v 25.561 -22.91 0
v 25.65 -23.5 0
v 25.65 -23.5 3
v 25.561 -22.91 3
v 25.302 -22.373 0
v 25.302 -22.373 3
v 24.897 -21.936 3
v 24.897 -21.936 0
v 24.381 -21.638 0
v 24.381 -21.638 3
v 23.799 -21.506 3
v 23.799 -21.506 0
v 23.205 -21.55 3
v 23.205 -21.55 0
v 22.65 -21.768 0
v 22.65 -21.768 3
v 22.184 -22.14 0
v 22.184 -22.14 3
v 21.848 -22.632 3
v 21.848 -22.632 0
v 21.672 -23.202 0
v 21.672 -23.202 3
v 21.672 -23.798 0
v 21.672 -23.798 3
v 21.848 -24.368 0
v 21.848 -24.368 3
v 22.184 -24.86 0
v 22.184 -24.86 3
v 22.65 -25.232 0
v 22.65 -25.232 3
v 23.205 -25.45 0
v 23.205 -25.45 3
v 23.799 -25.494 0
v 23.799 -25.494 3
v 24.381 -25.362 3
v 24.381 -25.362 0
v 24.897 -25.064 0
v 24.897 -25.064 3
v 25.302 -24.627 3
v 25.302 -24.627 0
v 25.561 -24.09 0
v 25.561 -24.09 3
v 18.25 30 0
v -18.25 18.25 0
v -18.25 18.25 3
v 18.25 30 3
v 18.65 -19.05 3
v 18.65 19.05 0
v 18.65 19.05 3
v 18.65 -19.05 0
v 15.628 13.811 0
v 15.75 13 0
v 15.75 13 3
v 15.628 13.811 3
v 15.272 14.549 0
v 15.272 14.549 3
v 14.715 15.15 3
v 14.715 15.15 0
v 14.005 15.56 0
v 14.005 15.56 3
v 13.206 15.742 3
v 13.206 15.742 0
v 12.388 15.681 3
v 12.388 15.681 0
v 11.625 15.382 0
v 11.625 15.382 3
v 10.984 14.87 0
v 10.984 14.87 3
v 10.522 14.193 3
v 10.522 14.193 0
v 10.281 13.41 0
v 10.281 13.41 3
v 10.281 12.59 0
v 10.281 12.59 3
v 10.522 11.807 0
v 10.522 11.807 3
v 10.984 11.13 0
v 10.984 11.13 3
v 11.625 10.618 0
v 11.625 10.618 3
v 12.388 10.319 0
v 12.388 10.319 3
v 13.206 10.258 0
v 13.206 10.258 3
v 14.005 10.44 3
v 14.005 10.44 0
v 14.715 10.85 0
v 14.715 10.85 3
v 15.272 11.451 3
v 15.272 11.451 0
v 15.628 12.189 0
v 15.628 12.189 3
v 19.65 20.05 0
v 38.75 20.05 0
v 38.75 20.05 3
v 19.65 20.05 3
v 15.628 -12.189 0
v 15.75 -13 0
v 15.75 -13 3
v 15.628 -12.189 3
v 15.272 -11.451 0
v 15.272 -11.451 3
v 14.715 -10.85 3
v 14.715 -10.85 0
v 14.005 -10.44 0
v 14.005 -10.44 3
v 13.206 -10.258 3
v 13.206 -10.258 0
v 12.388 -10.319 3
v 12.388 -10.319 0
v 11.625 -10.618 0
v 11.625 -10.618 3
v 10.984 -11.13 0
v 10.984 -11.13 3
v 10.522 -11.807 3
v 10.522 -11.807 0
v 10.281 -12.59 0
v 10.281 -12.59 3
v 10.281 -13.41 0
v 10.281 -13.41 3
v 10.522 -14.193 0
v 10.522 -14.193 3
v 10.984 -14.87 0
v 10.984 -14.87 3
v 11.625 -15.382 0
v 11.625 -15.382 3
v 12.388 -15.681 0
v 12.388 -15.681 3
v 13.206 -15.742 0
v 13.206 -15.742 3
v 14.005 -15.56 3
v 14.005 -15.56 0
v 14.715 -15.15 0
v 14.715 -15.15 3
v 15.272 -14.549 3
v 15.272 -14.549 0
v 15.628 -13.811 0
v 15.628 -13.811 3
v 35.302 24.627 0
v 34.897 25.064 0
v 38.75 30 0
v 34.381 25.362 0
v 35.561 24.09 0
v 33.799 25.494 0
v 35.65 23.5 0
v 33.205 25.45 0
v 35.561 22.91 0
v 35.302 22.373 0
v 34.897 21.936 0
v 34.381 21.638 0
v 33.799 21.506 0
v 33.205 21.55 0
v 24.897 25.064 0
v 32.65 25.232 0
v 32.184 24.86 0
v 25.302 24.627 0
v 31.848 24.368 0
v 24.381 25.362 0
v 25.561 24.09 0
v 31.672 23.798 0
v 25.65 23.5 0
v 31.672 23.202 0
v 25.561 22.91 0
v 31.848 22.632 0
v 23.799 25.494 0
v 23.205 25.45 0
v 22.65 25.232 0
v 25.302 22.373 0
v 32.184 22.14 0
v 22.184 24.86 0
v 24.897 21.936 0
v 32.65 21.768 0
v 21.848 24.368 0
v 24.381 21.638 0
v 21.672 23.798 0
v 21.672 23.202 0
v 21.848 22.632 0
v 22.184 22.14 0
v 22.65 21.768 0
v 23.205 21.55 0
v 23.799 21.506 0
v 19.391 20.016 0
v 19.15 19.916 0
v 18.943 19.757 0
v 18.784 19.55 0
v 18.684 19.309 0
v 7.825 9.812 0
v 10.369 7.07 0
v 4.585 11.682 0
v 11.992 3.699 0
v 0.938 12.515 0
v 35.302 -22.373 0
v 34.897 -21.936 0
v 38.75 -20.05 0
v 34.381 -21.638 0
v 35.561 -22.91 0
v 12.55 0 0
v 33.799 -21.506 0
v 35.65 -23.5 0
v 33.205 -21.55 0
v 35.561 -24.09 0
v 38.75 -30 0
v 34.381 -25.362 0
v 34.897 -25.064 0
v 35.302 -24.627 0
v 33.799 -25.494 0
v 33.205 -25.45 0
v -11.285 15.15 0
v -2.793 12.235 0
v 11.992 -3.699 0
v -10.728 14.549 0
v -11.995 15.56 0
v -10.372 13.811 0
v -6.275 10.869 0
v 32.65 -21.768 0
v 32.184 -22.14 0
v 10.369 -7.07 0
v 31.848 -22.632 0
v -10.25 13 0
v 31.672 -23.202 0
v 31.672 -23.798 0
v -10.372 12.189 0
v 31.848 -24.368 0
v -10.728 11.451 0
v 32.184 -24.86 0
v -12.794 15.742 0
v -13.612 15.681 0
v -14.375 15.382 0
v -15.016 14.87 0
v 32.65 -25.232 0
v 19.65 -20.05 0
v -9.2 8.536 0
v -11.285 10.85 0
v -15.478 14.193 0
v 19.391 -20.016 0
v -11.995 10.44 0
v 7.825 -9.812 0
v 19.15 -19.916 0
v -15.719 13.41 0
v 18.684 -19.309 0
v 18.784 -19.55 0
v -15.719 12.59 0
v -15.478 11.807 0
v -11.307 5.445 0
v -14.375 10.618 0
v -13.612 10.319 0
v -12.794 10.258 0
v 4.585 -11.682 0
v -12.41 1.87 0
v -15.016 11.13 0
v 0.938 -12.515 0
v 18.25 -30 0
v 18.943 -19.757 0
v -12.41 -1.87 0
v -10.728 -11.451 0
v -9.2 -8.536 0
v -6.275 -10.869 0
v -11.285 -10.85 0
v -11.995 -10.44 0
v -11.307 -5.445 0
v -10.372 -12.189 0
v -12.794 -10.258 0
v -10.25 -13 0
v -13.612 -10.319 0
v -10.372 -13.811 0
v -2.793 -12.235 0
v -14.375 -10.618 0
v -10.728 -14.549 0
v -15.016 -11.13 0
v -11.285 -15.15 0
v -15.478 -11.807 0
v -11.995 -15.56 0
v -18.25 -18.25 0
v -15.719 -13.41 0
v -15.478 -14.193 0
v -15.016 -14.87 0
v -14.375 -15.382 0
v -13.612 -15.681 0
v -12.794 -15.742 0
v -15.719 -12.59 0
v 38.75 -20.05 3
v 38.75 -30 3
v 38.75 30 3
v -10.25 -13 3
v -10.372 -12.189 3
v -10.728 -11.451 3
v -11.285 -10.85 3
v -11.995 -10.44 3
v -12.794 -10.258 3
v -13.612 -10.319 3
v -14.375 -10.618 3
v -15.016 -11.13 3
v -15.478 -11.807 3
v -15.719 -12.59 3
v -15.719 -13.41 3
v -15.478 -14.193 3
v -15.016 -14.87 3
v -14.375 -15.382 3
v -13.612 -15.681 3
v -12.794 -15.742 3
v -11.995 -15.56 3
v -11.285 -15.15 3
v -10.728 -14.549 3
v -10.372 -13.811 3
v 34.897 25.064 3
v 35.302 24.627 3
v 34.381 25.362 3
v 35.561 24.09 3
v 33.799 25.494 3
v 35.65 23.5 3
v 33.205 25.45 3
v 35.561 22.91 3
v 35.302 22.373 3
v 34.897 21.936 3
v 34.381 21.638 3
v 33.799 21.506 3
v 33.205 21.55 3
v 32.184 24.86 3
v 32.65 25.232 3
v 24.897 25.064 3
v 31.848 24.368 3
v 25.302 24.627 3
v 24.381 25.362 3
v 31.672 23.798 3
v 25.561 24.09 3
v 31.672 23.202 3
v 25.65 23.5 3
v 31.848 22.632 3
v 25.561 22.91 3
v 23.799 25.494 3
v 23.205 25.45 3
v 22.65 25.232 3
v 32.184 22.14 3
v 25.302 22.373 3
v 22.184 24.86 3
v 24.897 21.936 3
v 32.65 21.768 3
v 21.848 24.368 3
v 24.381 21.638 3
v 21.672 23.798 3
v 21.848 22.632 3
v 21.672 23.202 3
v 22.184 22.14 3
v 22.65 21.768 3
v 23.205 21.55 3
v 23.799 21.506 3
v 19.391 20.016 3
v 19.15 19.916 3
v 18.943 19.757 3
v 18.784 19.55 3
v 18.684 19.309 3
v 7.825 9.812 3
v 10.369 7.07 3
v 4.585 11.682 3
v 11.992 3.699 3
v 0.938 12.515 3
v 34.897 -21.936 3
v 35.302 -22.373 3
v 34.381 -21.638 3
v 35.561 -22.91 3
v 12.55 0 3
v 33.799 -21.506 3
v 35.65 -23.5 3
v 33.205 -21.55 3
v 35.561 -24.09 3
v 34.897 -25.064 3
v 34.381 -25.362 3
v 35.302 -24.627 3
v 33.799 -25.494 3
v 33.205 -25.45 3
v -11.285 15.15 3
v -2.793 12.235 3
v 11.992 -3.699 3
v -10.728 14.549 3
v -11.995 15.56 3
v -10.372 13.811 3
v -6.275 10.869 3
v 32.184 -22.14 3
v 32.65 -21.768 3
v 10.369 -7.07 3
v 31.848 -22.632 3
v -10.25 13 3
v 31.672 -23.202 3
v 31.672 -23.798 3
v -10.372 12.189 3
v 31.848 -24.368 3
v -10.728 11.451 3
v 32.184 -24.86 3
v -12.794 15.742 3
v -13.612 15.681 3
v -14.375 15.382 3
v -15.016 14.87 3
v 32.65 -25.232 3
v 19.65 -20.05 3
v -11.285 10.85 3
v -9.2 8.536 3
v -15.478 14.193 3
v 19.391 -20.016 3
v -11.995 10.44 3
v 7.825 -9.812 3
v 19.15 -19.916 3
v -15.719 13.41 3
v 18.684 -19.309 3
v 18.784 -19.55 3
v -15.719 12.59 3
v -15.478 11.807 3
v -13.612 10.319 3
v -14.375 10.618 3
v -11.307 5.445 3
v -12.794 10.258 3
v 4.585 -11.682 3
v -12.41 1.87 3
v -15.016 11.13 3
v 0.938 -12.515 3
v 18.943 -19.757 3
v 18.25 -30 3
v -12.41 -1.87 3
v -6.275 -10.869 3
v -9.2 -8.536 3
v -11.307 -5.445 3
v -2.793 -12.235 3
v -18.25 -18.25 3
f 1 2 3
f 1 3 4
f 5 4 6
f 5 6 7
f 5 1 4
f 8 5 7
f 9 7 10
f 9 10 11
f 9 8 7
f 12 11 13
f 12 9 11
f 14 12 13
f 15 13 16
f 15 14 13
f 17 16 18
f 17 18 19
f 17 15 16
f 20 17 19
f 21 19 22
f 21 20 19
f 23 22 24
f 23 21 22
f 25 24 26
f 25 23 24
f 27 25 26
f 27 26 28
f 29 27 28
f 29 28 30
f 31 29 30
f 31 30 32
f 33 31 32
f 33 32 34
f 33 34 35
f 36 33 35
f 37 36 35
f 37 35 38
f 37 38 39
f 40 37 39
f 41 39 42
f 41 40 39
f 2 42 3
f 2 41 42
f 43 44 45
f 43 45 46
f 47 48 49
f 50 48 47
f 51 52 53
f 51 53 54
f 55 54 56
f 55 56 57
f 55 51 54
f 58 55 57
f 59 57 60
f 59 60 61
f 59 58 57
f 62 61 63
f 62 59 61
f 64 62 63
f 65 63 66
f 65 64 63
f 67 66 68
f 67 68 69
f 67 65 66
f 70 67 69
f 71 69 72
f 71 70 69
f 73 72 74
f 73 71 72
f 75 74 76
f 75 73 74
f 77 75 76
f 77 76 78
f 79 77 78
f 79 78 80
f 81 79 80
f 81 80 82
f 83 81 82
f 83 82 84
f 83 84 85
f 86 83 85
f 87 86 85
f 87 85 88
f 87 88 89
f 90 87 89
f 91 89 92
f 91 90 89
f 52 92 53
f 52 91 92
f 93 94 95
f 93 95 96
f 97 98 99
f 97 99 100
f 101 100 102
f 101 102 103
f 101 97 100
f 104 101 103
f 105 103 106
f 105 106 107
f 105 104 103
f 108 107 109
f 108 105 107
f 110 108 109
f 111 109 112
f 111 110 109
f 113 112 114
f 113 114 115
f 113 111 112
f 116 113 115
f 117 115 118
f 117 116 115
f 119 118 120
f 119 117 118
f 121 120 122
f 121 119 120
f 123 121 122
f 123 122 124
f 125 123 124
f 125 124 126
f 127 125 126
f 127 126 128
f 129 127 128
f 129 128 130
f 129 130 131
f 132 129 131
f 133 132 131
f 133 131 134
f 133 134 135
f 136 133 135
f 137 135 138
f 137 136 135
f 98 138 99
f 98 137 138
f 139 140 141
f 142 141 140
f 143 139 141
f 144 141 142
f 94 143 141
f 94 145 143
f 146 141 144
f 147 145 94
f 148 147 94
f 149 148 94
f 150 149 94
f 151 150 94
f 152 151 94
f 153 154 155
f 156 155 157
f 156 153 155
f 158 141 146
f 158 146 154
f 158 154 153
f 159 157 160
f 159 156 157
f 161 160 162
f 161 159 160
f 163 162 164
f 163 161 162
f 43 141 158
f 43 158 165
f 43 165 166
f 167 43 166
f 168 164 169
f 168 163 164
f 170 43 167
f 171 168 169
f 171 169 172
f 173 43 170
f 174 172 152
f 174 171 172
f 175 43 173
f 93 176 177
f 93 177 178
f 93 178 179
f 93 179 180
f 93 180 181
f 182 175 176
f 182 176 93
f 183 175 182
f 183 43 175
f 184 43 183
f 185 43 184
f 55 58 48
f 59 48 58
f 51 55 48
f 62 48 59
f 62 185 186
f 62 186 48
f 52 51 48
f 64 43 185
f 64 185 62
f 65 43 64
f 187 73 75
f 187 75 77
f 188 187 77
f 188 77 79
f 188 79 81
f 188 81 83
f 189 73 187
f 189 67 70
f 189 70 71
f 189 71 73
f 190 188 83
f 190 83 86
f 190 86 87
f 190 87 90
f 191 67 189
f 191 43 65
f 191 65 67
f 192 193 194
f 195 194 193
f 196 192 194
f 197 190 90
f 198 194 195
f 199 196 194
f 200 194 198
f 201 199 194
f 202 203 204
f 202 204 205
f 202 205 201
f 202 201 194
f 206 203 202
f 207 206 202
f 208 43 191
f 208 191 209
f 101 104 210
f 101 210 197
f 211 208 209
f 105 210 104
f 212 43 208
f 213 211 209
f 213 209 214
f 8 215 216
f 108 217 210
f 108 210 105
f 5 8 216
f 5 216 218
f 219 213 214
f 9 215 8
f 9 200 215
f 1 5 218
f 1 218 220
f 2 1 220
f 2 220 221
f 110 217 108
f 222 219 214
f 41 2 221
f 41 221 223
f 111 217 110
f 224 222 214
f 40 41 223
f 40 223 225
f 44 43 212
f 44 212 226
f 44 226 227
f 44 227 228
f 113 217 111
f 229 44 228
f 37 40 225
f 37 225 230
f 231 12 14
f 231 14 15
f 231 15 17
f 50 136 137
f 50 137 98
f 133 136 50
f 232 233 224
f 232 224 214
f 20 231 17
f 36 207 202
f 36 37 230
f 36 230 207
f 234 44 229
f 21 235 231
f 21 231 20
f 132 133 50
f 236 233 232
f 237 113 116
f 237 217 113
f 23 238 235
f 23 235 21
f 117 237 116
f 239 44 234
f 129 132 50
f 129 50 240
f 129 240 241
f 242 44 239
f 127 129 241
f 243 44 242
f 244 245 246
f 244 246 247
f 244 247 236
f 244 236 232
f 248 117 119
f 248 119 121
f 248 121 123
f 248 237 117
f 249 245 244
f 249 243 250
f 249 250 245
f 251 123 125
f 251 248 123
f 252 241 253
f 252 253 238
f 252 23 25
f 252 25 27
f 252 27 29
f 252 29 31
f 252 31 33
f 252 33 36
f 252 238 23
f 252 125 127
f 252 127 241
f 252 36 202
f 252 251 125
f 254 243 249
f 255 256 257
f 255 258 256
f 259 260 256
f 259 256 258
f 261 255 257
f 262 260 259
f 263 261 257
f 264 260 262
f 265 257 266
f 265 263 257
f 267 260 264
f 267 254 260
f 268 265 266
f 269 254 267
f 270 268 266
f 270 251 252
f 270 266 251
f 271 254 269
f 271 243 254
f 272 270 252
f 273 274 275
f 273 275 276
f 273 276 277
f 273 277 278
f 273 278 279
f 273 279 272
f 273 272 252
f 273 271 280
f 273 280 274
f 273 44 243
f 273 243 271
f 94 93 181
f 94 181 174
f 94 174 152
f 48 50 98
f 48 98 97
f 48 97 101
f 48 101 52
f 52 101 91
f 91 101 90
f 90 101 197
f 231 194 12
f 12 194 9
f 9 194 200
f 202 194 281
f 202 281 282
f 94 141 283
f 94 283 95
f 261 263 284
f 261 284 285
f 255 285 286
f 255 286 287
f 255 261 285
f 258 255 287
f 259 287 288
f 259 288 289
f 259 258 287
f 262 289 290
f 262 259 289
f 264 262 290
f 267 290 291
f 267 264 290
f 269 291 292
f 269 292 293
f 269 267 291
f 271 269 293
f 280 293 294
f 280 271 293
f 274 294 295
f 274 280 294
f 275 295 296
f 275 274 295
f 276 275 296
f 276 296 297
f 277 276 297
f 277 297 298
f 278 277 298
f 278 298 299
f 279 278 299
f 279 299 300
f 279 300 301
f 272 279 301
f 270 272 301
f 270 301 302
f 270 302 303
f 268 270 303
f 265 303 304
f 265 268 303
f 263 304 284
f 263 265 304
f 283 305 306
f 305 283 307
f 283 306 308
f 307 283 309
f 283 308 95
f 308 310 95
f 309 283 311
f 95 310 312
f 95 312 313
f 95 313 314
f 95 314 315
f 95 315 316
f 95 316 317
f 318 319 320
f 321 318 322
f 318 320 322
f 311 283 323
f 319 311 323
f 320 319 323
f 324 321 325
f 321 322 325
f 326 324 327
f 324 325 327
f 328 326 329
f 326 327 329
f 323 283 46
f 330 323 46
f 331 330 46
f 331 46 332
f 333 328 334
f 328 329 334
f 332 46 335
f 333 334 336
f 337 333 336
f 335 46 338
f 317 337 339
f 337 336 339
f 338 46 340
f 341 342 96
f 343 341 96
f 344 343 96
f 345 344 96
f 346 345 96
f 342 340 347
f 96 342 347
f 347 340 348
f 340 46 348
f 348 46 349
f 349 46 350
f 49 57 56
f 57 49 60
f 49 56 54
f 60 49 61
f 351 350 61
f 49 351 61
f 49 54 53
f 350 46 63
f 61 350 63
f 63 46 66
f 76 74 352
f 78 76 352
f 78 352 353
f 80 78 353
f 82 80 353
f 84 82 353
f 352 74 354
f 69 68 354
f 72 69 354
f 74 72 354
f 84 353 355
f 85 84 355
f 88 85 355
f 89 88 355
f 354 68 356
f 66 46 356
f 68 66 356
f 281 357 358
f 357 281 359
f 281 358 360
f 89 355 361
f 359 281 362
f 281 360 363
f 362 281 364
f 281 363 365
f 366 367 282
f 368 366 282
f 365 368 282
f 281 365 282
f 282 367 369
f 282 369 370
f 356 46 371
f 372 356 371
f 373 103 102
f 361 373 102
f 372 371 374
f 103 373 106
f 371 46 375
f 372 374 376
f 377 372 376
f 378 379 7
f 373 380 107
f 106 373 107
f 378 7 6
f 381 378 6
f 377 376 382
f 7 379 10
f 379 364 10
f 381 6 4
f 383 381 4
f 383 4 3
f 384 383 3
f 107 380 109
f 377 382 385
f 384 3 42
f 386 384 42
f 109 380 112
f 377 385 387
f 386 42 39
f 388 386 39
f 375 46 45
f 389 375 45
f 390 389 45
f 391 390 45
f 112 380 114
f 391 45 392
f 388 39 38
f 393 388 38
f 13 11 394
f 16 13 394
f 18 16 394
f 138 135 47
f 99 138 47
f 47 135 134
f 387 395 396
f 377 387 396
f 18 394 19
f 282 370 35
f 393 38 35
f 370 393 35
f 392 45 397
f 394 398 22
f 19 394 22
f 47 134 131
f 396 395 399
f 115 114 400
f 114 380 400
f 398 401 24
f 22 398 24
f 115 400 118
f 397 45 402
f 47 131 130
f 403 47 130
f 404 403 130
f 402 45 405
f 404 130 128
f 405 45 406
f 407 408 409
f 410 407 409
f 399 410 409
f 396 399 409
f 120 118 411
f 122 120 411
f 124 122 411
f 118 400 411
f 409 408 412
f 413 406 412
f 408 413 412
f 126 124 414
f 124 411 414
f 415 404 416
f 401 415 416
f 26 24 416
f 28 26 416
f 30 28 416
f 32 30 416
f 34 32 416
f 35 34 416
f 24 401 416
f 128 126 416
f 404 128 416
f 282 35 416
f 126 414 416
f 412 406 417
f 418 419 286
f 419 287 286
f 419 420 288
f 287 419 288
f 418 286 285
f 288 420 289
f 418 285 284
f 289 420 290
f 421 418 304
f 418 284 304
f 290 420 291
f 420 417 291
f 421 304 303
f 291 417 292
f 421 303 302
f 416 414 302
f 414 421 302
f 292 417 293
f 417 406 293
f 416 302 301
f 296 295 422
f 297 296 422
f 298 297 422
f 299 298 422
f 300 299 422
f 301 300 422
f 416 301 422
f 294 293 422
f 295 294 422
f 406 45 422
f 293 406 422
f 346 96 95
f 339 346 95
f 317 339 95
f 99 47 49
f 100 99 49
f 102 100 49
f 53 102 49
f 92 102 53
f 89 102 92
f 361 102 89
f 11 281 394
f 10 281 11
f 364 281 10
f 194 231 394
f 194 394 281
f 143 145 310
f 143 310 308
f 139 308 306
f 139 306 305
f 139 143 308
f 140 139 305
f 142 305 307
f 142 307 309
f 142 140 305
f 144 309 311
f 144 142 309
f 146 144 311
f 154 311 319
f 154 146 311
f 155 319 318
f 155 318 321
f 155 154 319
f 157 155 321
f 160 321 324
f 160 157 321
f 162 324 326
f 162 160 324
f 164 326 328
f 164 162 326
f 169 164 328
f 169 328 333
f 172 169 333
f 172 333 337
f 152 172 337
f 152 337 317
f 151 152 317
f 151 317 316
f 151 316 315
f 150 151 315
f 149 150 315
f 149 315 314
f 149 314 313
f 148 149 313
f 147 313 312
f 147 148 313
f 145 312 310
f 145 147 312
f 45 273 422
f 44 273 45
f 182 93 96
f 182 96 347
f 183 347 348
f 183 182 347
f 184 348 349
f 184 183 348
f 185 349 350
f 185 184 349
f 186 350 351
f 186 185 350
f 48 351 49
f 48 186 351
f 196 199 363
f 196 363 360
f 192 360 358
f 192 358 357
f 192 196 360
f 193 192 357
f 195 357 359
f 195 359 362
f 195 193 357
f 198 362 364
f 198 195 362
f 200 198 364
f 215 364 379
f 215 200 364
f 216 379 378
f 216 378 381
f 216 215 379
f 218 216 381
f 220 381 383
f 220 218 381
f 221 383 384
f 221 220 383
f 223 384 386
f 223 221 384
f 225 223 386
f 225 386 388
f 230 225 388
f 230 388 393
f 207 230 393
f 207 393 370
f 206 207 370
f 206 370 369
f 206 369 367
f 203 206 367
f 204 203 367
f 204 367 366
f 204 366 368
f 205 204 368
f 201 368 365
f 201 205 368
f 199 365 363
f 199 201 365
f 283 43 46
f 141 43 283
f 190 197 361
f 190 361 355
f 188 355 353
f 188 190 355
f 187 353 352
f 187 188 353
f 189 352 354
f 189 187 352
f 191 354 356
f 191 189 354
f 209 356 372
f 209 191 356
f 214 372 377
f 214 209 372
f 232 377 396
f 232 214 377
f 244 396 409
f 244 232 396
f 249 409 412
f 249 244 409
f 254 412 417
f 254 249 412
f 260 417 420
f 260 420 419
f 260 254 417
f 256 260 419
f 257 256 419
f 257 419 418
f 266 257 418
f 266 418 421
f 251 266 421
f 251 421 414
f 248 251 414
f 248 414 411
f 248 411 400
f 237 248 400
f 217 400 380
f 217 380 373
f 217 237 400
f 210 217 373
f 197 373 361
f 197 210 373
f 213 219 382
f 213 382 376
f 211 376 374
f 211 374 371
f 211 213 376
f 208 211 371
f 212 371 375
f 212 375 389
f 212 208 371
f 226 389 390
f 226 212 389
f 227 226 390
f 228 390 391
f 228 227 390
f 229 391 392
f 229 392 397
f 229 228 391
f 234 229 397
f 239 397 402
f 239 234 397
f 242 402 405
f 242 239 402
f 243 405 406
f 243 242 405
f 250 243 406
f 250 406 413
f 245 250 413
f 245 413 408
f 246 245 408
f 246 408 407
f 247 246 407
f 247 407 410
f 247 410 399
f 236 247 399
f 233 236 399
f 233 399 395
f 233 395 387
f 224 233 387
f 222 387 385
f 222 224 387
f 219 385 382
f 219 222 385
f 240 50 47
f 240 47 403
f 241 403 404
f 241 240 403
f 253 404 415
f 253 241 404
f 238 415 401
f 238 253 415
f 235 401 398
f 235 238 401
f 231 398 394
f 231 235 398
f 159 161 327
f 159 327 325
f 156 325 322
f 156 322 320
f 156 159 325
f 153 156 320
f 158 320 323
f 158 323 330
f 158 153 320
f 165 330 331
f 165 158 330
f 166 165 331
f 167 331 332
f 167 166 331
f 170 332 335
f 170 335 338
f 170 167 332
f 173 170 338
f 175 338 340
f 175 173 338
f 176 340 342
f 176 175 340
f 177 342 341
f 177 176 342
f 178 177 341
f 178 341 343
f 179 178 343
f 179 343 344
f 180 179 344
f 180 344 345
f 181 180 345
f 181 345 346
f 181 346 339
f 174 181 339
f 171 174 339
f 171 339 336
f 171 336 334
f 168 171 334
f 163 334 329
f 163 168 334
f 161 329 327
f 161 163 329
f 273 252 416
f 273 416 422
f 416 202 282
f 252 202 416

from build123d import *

# Parameters (mm, degrees)
SKETCH1_R           = 2.75
SKETCH1_R_2         = 12.55
SKETCH1_R_3         = 2
BOSS_EXTRUDE1_DEPTH = 3


with BuildPart() as part:
    # Sketch1 → Boss-Extrude1 (new body)
    with BuildSketch(Plane(origin=(0, 0, 0), x_dir=(0, 1, 0), z_dir=(0, 0, 1))):
        with BuildLine():
            Line((-18.25, 18.25), (18.25, 18.25))
            Line((18.25, 18.25), (30, -18.25))
            Line((30, -18.25), (30, -38.75))
            Line((30, -38.75), (20.05, -38.75))
            Line((20.05, -38.75), (20.05, -19.65))
            ThreePointArc((20.05, -19.65), (19.757106781, -18.942893219), (19.05, -18.65))
            Line((19.05, -18.65), (-19.05, -18.65))
            ThreePointArc((-19.05, -18.65), (-19.757106781, -18.942893219), (-20.05, -19.65))
            Line((-20.05, -19.65), (-20.05, -38.75))
            Line((-20.05, -38.75), (-30, -38.75))
            Line((-30, -38.75), (-30, -18.25))
            Line((-30, -18.25), (-18.25, 18.25))
        make_face()
        with Locations(Location((-13, 13, 0), (0, 0, 270))):
            Circle(SKETCH1_R, mode=Mode.SUBTRACT)
        with Locations(Location((0, 0, 0), (0, 0, 270))):
            Circle(SKETCH1_R_2, mode=Mode.SUBTRACT)
        with Locations(Location((13, 13, 0), (0, 0, 270))):
            Circle(SKETCH1_R, mode=Mode.SUBTRACT)
        with Locations(Location((13, -13, 0), (0, 0, 270))):
            Circle(SKETCH1_R, mode=Mode.SUBTRACT)
        with Locations(Location((-13, -13, 0), (0, 0, 270))):
            Circle(SKETCH1_R, mode=Mode.SUBTRACT)
        with Locations(Location((-23.5, -23.65, 0), (0, 0, 270))):
            Circle(SKETCH1_R_3, mode=Mode.SUBTRACT)
        with Locations(Location((23.5, -23.65, 0), (0, 0, 270))):
            Circle(SKETCH1_R_3, mode=Mode.SUBTRACT)
        with Locations(Location((23.5, -33.65, 0), (0, 0, 270))):
            Circle(SKETCH1_R_3, mode=Mode.SUBTRACT)
        with Locations(Location((-23.5, -33.65, 0), (0, 0, 270))):
            Circle(SKETCH1_R_3, mode=Mode.SUBTRACT)
    extrude(amount=BOSS_EXTRUDE1_DEPTH)


solid = part.part
